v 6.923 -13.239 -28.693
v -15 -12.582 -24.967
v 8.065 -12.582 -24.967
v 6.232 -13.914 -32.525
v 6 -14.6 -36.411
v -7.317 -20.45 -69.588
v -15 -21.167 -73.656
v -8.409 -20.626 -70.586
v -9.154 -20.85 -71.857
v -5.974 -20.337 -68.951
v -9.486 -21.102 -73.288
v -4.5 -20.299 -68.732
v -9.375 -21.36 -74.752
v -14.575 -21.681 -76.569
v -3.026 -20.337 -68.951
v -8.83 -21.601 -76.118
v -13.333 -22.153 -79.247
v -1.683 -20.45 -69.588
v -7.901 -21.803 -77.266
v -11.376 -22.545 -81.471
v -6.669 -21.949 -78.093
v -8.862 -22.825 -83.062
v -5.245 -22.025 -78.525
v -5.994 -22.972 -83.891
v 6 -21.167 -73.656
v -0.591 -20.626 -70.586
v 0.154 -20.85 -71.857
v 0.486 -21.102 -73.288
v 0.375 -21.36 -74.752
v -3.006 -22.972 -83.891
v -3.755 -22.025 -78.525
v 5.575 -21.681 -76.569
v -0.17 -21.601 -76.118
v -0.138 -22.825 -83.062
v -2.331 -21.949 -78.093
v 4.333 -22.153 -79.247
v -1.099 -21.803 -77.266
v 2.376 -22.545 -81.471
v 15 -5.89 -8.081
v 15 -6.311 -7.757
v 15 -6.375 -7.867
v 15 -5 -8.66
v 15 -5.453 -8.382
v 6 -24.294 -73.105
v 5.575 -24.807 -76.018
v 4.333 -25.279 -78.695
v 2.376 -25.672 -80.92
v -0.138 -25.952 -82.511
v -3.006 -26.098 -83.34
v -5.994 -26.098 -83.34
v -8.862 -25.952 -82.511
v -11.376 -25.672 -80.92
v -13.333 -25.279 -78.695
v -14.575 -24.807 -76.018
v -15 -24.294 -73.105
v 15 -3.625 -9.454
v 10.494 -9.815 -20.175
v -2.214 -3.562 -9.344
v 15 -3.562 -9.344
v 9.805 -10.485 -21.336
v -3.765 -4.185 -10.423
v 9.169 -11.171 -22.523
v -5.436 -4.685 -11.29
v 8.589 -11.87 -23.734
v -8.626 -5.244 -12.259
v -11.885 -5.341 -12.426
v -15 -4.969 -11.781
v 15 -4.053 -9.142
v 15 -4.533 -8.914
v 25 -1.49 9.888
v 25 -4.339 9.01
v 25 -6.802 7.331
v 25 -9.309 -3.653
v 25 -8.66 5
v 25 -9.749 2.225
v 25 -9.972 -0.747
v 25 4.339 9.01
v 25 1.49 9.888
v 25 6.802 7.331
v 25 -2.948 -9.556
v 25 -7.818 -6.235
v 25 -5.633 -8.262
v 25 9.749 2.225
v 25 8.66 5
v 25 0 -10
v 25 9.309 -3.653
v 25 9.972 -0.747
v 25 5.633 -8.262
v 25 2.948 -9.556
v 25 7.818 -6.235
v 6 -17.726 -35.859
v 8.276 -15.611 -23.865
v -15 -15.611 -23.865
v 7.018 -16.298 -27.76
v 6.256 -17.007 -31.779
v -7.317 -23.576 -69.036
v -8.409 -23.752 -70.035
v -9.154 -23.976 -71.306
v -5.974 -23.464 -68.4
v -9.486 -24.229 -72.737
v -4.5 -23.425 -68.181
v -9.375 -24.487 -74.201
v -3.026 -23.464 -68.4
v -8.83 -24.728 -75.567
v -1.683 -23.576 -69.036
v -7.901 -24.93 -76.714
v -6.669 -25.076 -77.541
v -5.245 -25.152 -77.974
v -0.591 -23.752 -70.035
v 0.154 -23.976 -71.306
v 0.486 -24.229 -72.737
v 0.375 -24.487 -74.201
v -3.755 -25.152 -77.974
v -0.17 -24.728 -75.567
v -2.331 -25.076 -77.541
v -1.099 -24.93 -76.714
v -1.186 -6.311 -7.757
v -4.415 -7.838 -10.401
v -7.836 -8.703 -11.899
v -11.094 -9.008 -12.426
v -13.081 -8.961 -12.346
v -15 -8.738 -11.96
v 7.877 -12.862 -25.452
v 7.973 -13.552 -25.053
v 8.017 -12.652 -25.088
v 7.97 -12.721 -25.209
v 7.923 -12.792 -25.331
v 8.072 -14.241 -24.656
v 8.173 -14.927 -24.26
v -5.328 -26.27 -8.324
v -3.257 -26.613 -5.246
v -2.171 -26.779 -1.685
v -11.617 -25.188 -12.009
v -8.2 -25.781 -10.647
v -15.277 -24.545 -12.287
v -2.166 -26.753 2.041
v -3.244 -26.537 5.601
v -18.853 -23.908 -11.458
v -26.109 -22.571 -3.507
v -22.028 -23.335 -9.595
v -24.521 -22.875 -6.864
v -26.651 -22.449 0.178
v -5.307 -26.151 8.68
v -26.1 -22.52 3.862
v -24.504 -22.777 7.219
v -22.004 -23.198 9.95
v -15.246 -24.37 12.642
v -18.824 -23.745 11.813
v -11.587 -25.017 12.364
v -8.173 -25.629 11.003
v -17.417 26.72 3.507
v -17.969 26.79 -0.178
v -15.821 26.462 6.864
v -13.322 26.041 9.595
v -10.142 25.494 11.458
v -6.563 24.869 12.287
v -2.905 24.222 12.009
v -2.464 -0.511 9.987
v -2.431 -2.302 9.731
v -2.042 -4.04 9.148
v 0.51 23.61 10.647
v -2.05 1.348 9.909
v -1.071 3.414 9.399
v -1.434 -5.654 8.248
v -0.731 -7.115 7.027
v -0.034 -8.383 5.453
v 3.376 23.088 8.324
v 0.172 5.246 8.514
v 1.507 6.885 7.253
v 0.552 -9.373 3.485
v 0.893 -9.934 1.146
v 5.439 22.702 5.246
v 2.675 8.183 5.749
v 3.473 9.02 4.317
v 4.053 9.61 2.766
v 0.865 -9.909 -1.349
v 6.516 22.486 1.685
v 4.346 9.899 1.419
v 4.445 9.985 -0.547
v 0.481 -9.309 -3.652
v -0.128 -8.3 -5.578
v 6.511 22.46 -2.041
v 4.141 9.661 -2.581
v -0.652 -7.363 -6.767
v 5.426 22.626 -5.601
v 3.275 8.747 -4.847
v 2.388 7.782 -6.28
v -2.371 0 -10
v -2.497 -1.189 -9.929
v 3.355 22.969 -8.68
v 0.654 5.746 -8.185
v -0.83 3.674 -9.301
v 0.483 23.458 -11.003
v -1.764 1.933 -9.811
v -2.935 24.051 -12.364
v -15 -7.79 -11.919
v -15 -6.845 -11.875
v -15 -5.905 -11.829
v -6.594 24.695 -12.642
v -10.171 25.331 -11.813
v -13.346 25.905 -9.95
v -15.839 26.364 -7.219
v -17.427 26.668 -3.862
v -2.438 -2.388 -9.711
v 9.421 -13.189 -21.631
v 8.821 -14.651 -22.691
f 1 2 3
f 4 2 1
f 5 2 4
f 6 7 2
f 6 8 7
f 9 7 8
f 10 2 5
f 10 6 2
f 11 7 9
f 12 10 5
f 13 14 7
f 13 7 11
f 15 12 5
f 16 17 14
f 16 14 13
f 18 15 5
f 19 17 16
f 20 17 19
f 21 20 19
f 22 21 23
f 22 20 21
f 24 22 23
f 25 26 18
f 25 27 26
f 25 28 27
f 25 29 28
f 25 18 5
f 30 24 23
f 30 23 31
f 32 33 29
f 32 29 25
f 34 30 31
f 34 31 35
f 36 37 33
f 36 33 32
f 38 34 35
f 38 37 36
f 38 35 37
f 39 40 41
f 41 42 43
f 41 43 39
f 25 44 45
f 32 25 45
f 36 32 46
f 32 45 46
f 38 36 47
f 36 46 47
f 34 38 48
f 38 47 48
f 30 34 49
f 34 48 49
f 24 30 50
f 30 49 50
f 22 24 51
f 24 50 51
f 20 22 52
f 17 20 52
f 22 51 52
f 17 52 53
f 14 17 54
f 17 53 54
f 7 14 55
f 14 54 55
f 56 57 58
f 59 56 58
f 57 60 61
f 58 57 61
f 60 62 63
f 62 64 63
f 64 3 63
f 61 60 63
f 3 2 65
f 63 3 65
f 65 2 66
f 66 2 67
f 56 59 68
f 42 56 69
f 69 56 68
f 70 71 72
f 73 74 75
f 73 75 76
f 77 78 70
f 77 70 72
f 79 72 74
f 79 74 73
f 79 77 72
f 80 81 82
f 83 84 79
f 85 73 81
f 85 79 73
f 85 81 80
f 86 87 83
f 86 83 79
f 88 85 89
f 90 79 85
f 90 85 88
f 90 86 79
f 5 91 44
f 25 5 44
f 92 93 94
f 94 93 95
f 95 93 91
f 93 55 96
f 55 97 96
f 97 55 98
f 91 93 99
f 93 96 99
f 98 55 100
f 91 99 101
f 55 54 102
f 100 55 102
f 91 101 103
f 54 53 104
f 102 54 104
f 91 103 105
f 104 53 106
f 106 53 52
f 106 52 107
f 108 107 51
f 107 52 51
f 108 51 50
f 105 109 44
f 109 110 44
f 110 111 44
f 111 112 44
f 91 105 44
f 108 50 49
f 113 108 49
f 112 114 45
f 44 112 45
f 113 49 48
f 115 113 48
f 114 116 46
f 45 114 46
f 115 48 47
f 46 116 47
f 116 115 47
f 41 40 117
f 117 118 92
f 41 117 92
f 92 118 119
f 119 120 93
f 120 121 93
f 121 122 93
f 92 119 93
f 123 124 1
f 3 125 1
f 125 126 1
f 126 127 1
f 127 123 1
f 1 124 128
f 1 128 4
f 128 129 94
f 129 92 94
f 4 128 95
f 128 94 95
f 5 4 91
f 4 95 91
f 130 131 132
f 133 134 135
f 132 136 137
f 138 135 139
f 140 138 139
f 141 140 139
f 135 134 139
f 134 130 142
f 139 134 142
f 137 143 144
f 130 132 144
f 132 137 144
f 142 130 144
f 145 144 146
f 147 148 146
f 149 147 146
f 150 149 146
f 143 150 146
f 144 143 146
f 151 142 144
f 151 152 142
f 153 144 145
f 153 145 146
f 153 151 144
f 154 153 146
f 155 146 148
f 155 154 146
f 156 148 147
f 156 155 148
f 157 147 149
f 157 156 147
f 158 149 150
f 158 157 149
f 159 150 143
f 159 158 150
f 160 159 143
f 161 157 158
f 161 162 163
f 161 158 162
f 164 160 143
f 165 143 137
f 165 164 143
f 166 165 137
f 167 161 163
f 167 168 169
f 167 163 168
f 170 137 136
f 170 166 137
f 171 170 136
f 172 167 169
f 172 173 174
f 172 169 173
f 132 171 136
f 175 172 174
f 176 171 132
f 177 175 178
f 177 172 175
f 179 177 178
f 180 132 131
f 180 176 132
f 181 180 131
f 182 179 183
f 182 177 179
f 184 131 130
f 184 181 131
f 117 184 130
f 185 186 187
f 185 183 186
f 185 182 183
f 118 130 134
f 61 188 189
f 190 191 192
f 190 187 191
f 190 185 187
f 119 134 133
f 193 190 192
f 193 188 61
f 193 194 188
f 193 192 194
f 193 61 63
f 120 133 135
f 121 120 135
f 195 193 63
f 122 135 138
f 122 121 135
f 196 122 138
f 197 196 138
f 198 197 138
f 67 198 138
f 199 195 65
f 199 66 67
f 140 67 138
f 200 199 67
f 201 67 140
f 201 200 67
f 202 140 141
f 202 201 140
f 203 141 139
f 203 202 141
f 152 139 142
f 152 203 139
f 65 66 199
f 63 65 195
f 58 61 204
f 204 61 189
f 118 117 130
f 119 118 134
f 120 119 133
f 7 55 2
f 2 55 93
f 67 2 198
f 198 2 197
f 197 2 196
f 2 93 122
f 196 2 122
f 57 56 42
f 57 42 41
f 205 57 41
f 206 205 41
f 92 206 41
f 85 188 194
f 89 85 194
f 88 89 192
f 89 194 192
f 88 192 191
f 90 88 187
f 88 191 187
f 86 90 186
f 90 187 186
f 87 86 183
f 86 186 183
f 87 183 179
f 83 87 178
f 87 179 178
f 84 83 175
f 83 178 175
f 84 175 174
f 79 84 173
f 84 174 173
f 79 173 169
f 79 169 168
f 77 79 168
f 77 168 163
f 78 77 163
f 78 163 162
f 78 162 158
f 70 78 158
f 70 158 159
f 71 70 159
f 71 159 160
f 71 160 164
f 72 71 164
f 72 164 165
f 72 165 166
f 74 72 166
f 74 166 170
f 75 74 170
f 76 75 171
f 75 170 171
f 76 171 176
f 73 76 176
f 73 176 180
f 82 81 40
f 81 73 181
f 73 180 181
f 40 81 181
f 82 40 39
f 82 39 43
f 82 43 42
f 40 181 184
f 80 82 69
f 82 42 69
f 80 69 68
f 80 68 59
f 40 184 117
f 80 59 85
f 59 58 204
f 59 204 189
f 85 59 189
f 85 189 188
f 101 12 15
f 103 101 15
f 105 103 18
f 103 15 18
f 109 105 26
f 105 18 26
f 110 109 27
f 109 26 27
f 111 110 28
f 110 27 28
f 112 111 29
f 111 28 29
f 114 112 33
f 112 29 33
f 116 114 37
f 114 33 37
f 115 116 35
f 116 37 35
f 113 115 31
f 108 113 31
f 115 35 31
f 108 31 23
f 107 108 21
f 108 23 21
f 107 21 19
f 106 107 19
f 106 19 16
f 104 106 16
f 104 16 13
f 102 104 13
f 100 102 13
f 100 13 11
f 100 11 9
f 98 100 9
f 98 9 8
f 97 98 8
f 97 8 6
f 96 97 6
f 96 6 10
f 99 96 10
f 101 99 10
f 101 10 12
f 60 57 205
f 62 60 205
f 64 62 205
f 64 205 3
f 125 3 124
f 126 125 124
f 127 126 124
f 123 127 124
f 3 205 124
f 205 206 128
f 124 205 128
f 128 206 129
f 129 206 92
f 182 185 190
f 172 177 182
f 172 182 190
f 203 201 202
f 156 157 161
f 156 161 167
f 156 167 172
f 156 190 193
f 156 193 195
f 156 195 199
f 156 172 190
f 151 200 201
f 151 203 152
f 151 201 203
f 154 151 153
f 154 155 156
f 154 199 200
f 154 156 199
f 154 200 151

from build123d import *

# Parameters (mm, degrees)
BOSS_EXTRUDE1_DEPTH      = 25
BOSS_EXTRUDE1_DEPTH_BACK = 10
SKETCH1_R                = 10
SKETCH2_R                = 12.5
BOSS_EXTRUDE2_DEPTH      = 25
BOSS_EXTRUDE3_DEPTH      = 15
BOSS_EXTRUDE3_DEPTH_BACK = 15
CUT_EXTRUDE1_DEPTH       = 15
BOSS_EXTRUDE4_DEPTH      = 3.175
CUT_EXTRUDE2_DEPTH       = 96.96083651
CUT_EXTRUDE2_DEPTH_BACK  = 96.96083651
SKETCH10_R               = 5
CUT_EXTRUDE3_DEPTH       = 10


with BuildPart() as part:
    # Sketch1 → Boss-Extrude1 (new, two sides: drawn at the far end of the back side and taken through both)
    with BuildSketch(Plane(origin=(0, 0, 0), x_dir=(0, 0, -1), z_dir=(1, 0, 0)).offset(-BOSS_EXTRUDE1_DEPTH_BACK)):
        Circle(SKETCH1_R)
    extrude(amount=BOSS_EXTRUDE1_DEPTH + BOSS_EXTRUDE1_DEPTH_BACK)

    # Sketch2 → Boss-Extrude2 (add, symmetric)
    with BuildSketch(Plane(origin=(-10, 0, 0), x_dir=(0.9848069802426886, -0.173652560203633, 1.5808464272800858e-08), z_dir=(0.17364817766692736, 0.9847821256419462, -0.007104604780387524))):
        Circle(SKETCH2_R)
    extrude(amount=BOSS_EXTRUDE2_DEPTH, both=True)

    # Sketch5 → Boss-Extrude3 (add, two sides: drawn at the far end of the back side and taken through both)
    with BuildSketch(Plane(origin=(0, 0, 0), x_dir=(0, 0, -1), z_dir=(1, 0, 0)).offset(-BOSS_EXTRUDE3_DEPTH_BACK)):
        Polygon((0.79375, 1.374815329), (-0.79375, -1.374815329), (23.864525326, -15.611277226), (25.452025326, -12.861646569), align=None)
    extrude(amount=BOSS_EXTRUDE3_DEPTH + BOSS_EXTRUDE3_DEPTH_BACK)

    # Sketch6 → Cut-Extrude1 (cut)
    with BuildSketch(Plane(origin=(0, 1.374815329, -0.79375), x_dir=(1, 0, 0), z_dir=(0, 0.8660254037844419, -0.49999999999999434))):
        Polygon((15, 28.472923795), (15, 10), (8.276405599, 28.472923795), align=None)
    extrude(amount=-CUT_EXTRUDE1_DEPTH, mode=Mode.SUBTRACT)

    # Sketch8 → Boss-Extrude4 (add)
    with BuildSketch(Plane(origin=(0, -11.059465432, 1.950082148), x_dir=(1, 0, 0), z_dir=(0, 0.9848077530122095, -0.17364817766692275))):
        with BuildLine():
            Line((-15, 26.212839405), (8.276405599, 26.212839405))
            ThreePointArc((8.276405599, 26.212839405), (6.573986329, 32.197305321), (6, 38.392674831))
            Line((6, 38.392674831), (6, 76.212839405))
            ThreePointArc((6, 76.212839405), (-4.5, 86.712839405), (-15, 76.212839405))
            Line((-15, 76.212839405), (-15, 26.212839405))
        make_face()
    extrude(amount=BOSS_EXTRUDE4_DEPTH)

    # Sketch9 → Cut-Extrude2 (cut, two sides: drawn at the far end of the back side and taken through both)
    with BuildSketch(Plane(origin=(0, -7.932700816, 1.398749184), x_dir=(1, 0, 0), z_dir=(0, 0.9848077530122094, -0.173648177666923)).offset(-CUT_EXTRUDE2_DEPTH_BACK)):
        with BuildLine():
            Line((10.969458516, 56.012713561), (13.826274408, 16.792062616))
            ThreePointArc((13.826274408, 16.792062616), (6.0891037, 35.942860434), (10.969458516, 56.012713561))
        make_face()
    extrude(amount=CUT_EXTRUDE2_DEPTH + CUT_EXTRUDE2_DEPTH_BACK, mode=Mode.SUBTRACT)

    # Sketch10 → Cut-Extrude3 (cut)
    with BuildSketch(Plane(origin=(0, -7.932700816, 1.398749184), x_dir=(1, 0, 0), z_dir=(0, 0.9848077530122094, -0.17364817766692284))):
        with Locations((-4.5, 76.212839405)):
            Circle(SKETCH10_R)
    extrude(amount=-CUT_EXTRUDE3_DEPTH, mode=Mode.SUBTRACT)


solid = part.part
